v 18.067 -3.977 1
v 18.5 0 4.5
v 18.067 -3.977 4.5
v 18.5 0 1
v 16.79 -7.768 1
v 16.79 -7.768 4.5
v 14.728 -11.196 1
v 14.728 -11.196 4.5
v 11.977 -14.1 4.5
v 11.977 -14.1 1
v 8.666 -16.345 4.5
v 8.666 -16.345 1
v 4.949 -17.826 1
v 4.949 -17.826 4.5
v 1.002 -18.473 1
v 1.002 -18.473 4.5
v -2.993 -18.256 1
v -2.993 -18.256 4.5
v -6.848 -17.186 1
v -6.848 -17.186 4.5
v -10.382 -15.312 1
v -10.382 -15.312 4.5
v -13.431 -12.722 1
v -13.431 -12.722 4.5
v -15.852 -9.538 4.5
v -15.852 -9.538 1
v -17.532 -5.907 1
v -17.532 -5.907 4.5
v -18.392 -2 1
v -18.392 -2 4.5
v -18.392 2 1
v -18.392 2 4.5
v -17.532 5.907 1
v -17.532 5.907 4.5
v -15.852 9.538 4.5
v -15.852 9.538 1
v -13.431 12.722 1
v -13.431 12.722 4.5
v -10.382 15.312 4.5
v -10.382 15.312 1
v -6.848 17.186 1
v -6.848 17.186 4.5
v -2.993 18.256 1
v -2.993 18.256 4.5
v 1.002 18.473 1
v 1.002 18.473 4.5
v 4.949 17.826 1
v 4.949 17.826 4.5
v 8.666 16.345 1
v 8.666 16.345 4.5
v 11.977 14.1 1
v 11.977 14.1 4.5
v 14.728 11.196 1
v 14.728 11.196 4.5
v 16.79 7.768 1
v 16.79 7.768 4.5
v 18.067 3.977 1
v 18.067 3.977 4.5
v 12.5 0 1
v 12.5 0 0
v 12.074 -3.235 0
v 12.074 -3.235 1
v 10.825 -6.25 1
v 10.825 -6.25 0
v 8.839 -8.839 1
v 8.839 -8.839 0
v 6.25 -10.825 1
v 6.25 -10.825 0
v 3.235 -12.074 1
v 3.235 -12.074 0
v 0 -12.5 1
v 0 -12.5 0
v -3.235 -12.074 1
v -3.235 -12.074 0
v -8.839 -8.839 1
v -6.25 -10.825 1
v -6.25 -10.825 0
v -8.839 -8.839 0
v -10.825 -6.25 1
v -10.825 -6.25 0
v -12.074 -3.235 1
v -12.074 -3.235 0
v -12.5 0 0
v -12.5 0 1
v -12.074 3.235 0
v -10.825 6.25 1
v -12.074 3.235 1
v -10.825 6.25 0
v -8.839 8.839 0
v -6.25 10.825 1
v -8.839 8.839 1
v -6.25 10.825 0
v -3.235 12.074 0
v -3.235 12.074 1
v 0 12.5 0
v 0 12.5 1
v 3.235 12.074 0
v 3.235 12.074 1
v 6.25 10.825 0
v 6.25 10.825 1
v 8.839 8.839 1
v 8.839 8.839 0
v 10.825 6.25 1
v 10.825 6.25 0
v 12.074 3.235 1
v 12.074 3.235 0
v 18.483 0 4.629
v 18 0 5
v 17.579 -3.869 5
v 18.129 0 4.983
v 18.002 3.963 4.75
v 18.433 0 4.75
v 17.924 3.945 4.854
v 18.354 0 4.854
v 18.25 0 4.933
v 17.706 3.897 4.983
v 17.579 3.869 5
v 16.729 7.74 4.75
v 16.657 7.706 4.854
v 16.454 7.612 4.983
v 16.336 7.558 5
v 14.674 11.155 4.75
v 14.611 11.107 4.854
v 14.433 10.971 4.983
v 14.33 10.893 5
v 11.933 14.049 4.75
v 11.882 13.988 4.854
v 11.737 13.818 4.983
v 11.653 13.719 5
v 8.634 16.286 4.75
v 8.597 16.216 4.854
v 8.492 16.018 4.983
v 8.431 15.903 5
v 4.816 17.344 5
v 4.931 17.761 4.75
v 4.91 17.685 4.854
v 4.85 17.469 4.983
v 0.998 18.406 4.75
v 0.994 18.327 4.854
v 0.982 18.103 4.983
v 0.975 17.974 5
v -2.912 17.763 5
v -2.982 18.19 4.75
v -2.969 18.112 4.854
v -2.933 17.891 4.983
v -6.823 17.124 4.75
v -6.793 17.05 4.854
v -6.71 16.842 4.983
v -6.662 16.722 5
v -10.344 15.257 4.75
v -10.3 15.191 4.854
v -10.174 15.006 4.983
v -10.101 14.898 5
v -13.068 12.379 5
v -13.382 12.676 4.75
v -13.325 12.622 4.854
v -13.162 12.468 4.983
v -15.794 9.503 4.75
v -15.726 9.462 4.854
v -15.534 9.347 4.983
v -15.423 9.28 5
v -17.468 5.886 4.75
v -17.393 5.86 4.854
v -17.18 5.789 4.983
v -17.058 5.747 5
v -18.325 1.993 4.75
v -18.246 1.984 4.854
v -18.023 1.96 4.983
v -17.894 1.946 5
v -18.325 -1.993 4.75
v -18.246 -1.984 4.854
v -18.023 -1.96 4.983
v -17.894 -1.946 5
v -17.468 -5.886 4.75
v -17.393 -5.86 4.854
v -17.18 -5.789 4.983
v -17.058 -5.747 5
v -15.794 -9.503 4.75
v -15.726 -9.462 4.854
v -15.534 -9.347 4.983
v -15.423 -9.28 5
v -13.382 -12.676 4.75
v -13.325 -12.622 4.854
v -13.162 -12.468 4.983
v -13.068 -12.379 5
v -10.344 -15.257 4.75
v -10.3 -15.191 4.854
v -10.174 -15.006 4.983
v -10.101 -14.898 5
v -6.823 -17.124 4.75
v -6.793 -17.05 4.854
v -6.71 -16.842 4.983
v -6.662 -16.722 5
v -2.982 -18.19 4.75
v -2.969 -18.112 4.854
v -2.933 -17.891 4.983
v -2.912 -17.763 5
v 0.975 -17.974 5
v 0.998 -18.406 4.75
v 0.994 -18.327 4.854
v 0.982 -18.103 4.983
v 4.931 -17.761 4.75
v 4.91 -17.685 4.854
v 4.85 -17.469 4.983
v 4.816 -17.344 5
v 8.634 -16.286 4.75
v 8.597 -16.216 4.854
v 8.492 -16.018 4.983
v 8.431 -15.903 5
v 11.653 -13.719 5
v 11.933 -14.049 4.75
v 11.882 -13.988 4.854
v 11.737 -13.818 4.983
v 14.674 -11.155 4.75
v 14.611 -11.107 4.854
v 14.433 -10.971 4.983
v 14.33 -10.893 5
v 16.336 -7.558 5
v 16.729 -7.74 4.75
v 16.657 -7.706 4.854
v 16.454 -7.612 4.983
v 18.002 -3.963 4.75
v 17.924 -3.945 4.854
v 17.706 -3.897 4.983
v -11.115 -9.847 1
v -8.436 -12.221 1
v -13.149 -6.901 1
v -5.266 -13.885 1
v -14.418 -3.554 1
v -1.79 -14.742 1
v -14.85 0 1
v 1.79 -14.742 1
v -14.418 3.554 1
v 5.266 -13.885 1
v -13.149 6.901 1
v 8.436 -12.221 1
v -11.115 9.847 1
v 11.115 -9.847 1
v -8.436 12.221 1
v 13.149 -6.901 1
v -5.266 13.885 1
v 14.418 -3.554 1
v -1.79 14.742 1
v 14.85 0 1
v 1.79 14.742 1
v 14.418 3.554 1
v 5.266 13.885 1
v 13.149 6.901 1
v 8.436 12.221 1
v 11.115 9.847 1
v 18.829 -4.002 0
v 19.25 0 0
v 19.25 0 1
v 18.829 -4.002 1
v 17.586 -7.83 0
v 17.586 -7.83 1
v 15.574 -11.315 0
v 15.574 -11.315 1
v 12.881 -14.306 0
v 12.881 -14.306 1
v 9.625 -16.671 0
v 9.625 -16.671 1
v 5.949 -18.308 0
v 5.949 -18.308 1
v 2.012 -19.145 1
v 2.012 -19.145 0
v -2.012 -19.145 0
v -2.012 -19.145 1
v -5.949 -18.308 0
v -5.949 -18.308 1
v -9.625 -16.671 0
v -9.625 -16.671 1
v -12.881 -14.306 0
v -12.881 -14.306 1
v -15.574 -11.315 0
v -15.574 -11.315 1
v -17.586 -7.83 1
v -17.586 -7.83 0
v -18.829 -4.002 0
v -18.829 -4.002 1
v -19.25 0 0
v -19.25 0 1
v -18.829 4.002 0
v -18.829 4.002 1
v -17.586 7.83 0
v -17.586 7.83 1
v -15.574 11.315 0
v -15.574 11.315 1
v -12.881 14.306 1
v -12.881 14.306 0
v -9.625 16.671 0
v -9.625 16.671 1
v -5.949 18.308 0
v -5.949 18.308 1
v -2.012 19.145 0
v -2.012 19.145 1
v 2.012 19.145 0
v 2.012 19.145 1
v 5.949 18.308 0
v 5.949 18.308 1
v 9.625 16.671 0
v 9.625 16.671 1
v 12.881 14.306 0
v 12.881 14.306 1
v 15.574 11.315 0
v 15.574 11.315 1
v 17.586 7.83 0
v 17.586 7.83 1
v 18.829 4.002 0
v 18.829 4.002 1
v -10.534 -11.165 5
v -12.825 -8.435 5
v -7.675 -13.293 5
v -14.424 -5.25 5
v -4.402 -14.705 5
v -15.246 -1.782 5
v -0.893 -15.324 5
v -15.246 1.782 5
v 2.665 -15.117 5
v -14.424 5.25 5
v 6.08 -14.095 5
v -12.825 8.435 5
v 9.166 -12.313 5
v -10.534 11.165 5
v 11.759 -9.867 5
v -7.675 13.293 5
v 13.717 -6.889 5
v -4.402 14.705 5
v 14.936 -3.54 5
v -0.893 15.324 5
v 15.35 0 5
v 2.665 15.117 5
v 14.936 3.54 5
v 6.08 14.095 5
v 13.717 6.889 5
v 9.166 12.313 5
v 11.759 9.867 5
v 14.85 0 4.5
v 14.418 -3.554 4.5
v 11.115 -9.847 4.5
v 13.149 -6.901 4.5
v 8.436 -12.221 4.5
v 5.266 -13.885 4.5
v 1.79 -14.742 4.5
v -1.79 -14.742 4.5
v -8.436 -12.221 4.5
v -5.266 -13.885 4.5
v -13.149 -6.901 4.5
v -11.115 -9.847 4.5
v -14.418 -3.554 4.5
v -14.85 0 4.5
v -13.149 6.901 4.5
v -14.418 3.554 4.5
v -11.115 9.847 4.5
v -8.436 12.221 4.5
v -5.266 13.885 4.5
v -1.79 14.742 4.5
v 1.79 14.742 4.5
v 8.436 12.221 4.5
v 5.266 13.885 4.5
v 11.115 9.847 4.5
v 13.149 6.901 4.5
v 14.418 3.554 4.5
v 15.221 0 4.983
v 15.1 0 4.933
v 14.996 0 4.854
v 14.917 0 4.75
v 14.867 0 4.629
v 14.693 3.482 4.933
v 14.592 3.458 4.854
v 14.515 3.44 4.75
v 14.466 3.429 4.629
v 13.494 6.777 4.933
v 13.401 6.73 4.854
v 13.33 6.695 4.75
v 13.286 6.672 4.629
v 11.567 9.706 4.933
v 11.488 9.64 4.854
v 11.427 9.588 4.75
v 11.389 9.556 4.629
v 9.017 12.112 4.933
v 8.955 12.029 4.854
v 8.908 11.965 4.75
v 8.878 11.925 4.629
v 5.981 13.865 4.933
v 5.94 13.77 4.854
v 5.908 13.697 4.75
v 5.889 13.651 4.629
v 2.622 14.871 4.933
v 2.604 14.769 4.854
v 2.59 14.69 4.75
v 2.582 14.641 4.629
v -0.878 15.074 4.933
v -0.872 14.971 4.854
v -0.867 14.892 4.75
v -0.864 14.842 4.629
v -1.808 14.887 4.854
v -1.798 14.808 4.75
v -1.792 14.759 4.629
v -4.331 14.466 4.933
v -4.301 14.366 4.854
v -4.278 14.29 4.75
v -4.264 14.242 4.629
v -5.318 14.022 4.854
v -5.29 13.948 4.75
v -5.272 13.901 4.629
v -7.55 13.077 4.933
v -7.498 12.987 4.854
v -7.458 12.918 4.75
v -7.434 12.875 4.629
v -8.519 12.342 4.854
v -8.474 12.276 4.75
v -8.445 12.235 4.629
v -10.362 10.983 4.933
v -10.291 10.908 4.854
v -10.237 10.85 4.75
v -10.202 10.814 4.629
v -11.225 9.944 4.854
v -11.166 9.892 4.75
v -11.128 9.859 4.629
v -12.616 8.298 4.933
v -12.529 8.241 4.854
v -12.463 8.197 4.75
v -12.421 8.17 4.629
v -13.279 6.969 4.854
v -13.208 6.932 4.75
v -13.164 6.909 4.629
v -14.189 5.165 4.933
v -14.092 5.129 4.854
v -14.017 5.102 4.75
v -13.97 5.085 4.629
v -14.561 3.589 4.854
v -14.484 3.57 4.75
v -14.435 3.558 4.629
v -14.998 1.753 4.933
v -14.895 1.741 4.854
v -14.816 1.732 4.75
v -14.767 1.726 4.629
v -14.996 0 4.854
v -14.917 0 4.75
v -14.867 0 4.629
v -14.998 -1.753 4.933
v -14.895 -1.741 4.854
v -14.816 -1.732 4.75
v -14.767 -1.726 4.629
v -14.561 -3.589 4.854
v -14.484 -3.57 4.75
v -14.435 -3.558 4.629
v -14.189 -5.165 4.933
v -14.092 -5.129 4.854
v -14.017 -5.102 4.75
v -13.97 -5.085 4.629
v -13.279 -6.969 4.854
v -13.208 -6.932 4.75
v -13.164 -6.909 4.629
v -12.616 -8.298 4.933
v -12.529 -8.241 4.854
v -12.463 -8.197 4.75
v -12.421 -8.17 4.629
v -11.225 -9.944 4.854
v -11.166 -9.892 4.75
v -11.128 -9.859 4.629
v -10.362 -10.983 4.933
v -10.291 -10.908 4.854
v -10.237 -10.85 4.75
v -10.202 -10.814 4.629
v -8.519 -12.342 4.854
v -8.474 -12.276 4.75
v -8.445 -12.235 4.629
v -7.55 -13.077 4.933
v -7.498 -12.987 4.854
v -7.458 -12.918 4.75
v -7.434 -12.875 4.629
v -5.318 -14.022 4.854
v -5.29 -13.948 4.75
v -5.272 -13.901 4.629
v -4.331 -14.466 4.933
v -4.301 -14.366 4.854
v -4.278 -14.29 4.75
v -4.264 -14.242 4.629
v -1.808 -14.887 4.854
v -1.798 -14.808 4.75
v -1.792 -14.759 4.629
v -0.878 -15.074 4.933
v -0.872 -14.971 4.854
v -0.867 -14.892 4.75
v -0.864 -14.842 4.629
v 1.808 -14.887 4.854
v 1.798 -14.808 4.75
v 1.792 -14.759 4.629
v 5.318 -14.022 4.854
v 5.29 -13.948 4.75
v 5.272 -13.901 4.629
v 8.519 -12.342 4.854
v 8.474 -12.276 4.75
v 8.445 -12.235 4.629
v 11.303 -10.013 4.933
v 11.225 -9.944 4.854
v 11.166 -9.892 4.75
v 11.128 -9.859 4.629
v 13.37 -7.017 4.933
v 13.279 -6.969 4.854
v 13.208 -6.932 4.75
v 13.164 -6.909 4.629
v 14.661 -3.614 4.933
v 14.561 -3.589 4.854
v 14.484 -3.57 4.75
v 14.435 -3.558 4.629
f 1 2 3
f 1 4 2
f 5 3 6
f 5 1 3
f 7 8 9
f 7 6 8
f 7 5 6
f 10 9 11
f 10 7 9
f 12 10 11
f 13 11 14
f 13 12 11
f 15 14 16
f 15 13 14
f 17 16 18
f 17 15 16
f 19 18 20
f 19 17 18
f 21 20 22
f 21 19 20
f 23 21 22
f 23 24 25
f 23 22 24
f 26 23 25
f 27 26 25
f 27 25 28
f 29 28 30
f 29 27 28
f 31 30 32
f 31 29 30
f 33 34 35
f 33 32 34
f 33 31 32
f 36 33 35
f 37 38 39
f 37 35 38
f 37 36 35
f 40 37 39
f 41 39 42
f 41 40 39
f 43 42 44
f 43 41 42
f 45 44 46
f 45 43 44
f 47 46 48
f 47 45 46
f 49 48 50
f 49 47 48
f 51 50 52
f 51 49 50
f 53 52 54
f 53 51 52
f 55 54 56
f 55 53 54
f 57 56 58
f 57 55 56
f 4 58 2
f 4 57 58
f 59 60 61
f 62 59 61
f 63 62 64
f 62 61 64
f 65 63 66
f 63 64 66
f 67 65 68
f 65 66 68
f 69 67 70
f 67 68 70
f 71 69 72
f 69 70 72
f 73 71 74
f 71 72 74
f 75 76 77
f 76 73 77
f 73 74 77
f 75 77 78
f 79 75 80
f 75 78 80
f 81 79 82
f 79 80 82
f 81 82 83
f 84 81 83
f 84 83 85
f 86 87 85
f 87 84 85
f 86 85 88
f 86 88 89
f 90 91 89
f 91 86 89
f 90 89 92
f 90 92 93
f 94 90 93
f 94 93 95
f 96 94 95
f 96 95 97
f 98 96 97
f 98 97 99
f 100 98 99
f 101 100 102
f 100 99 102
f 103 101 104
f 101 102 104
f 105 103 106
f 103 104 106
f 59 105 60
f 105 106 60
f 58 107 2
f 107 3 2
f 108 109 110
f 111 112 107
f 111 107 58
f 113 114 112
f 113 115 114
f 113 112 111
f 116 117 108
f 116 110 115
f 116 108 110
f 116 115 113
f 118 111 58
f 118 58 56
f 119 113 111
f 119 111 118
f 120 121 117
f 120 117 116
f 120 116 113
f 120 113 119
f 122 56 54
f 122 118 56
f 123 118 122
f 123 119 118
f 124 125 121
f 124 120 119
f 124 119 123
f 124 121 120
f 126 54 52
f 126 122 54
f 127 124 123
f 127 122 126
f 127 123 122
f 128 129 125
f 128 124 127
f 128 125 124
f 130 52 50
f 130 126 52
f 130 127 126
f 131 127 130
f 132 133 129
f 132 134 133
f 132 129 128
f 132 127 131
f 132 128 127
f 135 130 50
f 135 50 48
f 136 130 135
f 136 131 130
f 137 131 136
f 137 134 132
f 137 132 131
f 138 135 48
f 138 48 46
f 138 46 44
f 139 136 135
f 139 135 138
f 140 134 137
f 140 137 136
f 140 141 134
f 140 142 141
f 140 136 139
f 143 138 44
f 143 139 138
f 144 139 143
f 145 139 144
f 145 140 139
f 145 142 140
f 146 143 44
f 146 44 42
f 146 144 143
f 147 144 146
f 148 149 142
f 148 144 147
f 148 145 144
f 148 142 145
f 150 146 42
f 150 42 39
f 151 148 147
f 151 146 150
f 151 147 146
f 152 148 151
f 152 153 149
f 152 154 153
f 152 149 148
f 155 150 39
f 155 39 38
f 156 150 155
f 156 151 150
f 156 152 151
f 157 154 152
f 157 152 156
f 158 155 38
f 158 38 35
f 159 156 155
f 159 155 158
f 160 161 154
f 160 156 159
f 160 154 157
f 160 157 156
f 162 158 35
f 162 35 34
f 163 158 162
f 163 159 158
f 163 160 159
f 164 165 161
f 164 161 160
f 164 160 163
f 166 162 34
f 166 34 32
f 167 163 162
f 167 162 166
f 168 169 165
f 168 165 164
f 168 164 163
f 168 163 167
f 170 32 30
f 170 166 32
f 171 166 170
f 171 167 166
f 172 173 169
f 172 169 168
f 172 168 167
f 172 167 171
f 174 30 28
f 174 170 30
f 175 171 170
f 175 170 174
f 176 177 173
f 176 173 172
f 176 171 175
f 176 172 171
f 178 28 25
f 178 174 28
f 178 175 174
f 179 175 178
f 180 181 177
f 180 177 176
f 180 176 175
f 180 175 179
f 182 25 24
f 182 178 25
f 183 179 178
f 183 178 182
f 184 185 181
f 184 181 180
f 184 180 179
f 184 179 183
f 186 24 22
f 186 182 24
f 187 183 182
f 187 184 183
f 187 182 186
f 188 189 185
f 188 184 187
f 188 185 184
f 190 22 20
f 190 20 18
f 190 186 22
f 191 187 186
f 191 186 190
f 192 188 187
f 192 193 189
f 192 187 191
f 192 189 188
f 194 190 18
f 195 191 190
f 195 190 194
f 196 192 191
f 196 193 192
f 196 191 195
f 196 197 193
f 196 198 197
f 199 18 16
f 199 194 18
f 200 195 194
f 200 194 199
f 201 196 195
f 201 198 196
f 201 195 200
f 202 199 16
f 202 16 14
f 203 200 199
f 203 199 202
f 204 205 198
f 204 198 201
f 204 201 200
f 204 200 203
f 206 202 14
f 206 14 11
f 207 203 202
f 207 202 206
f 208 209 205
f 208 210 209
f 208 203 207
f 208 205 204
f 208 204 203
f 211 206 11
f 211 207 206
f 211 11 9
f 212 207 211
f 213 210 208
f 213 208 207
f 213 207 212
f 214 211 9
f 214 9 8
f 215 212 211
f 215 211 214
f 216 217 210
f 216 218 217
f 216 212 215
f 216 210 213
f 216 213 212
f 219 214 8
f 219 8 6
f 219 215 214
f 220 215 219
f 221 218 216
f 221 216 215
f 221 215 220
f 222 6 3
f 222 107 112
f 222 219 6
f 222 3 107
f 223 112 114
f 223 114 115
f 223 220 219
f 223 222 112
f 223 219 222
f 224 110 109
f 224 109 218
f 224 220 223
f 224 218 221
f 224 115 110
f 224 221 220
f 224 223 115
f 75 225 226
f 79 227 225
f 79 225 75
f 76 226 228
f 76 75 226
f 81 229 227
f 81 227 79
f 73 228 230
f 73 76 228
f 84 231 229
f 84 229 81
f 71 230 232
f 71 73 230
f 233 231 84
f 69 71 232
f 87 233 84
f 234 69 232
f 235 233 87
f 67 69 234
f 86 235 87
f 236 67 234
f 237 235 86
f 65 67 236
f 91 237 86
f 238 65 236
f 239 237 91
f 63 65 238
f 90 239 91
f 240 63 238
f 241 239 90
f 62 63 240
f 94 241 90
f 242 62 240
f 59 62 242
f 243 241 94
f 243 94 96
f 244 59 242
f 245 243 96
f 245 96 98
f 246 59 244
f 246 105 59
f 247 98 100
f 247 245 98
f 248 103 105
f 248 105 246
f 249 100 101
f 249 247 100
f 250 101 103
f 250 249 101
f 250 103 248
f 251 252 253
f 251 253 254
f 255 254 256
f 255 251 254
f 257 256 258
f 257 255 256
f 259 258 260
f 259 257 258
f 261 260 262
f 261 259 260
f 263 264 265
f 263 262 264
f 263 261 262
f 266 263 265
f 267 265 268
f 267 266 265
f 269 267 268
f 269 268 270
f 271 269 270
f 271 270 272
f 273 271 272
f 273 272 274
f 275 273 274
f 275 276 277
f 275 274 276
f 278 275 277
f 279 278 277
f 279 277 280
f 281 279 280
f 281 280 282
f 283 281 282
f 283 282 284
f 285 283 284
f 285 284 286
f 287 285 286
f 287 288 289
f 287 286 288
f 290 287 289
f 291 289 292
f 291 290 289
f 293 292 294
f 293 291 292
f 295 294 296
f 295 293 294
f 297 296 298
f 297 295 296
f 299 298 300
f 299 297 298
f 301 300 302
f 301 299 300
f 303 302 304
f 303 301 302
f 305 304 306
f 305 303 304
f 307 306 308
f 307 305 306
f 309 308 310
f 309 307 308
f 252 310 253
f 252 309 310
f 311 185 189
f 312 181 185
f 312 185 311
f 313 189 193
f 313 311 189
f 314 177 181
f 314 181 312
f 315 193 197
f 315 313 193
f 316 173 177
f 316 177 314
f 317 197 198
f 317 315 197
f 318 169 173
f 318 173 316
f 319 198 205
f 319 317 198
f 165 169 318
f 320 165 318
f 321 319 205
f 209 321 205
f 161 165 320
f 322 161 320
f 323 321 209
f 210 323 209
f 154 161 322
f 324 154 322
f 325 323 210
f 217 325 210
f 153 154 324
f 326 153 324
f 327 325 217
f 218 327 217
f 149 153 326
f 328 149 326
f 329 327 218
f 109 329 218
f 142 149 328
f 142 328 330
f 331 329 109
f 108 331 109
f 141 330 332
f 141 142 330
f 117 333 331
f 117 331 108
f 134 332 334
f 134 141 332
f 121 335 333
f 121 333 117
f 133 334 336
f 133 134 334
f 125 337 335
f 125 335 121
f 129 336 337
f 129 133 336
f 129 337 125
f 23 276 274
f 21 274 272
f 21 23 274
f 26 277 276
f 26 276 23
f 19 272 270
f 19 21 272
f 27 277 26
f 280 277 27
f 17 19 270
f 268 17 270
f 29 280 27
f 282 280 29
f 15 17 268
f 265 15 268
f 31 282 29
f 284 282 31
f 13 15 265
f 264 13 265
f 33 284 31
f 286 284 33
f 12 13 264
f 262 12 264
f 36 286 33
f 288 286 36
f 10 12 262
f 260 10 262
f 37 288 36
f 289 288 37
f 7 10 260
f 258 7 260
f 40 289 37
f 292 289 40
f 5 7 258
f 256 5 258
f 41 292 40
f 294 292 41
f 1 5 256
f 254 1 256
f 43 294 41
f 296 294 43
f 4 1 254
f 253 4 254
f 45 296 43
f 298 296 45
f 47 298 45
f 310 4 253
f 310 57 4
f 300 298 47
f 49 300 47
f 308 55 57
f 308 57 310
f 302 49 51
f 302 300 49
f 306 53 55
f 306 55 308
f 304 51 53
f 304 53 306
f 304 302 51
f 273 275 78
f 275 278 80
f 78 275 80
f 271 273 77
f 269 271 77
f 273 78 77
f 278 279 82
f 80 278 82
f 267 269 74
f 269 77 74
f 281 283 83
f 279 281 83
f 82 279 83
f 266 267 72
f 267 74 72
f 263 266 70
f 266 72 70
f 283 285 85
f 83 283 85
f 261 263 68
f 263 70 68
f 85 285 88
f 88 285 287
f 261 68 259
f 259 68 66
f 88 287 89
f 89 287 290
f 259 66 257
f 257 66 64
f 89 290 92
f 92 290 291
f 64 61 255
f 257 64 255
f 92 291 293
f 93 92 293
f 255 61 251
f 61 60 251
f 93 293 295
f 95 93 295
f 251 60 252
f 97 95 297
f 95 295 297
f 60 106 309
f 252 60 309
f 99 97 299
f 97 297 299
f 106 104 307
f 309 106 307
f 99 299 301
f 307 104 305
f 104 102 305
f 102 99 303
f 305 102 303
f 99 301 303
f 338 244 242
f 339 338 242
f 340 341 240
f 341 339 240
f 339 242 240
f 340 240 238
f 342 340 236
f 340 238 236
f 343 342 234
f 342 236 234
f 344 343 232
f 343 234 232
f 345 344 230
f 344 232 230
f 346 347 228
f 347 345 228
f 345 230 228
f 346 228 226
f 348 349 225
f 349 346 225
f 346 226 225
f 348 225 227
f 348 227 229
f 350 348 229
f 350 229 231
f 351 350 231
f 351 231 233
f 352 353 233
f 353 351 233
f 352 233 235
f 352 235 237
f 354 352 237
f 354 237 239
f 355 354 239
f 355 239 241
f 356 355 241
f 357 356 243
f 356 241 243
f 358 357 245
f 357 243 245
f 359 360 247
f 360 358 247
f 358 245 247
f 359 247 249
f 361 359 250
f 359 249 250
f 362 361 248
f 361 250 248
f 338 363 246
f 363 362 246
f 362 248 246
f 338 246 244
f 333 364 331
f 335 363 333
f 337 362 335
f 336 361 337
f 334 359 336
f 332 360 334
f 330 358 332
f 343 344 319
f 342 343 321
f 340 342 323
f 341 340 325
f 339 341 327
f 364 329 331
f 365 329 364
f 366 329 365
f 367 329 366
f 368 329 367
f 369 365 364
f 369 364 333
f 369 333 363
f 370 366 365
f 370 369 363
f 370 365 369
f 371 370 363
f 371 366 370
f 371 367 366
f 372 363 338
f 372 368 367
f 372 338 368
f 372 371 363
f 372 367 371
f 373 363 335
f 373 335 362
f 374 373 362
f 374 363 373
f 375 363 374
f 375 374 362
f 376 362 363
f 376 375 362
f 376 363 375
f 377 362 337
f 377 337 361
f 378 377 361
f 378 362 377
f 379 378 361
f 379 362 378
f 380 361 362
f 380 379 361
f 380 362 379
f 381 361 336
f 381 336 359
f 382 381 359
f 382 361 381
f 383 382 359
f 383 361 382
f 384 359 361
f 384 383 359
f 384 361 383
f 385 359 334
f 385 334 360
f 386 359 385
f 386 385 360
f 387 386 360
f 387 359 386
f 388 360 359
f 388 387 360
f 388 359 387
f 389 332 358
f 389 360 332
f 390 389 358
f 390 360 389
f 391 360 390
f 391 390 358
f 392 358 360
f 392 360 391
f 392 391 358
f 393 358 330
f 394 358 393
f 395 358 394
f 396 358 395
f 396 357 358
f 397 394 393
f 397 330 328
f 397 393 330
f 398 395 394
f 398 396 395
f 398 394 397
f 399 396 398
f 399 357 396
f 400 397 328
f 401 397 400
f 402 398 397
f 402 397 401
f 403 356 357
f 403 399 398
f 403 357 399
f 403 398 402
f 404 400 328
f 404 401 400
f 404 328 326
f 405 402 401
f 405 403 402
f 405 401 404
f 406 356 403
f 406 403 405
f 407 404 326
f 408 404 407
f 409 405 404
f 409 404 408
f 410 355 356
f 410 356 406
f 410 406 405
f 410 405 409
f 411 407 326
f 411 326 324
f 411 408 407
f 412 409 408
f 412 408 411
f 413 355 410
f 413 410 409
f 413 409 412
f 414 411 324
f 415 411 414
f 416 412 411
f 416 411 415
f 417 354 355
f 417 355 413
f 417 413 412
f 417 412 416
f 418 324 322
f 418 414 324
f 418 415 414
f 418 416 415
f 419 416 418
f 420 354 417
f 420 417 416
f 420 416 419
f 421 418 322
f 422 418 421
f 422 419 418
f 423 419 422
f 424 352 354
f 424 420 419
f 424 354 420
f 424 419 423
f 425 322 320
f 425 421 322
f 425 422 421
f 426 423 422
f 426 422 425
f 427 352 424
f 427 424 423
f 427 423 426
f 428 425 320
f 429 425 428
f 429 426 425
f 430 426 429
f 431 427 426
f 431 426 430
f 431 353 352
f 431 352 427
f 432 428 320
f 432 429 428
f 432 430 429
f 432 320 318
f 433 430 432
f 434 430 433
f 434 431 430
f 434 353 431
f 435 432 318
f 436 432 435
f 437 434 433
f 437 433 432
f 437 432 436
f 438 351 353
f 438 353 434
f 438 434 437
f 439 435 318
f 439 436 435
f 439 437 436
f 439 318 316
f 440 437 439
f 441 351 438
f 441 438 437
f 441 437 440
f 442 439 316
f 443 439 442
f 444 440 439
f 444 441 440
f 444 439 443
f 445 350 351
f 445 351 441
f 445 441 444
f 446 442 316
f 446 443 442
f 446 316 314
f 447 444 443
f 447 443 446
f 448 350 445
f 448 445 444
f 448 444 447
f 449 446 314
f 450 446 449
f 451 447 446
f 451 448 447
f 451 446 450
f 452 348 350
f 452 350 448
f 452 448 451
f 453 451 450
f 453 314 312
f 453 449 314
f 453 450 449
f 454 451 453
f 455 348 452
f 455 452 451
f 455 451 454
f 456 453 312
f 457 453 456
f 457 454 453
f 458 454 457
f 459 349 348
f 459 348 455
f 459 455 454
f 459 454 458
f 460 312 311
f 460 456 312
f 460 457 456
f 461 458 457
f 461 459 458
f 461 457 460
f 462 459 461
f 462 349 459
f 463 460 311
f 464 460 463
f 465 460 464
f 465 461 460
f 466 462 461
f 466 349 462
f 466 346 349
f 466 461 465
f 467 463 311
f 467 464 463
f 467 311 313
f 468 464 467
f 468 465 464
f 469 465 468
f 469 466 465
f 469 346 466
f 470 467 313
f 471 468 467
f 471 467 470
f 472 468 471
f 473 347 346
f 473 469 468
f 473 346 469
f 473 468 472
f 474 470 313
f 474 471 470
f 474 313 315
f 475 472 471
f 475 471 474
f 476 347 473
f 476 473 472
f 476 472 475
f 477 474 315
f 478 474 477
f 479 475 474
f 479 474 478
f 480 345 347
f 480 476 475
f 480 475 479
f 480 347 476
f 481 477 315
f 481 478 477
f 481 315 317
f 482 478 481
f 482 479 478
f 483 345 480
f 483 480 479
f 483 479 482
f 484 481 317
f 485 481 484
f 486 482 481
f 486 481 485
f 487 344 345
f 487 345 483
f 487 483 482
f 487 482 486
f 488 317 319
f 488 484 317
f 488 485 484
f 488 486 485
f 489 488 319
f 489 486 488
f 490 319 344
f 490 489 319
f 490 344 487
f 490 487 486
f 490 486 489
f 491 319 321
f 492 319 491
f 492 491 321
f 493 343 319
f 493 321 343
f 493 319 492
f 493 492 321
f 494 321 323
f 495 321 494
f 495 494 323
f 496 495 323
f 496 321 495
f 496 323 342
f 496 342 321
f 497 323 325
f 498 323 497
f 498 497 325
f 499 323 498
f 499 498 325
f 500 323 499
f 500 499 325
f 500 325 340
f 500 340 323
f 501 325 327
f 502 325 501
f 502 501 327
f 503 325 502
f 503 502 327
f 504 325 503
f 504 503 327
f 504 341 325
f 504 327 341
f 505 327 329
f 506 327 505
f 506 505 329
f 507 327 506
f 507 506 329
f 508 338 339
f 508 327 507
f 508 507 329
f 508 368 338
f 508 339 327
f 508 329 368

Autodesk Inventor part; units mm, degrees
ref_plane "YZ Plane" through (0, 0, 0) normal (1, 0, 0) x (0, 1, 0)
ref_plane "XZ Plane" through (0, 0, 0) normal (0, 1, 0) x (-1, 0, 0)
ref_plane "XY Plane" through (0, 0, 0) normal (0, 0, 1) x (1, 0, 0)
sketch "Sketch1" plane through (0, 0, 0) normal (0, 0, 1) x (1, 0, 0)
  circle A0 centre (0, 0) radius 14.85
  circle A1 centre (0, 0) radius 18.5
  circle A2 centre (0, 0) radius 19.25
  circle A3 centre (0, 0) radius 12.5
  dimension "d0" = 29.7
  dimension "d1" = 37
  dimension "d2" = 38.5
  dimension "d8" = 25
extrude "Extrusion1" add sketch "Sketch1" along normal blind 5 contours A1
extrude "Extrusion2" add sketch "Sketch1" along normal blind 1
fillet "Fillet1" radius 0.5 2 edges at (-14.85, 0, 5) (-18.5, 0, 5)
properties part number "Mitutoyo-BD-black-ring"
